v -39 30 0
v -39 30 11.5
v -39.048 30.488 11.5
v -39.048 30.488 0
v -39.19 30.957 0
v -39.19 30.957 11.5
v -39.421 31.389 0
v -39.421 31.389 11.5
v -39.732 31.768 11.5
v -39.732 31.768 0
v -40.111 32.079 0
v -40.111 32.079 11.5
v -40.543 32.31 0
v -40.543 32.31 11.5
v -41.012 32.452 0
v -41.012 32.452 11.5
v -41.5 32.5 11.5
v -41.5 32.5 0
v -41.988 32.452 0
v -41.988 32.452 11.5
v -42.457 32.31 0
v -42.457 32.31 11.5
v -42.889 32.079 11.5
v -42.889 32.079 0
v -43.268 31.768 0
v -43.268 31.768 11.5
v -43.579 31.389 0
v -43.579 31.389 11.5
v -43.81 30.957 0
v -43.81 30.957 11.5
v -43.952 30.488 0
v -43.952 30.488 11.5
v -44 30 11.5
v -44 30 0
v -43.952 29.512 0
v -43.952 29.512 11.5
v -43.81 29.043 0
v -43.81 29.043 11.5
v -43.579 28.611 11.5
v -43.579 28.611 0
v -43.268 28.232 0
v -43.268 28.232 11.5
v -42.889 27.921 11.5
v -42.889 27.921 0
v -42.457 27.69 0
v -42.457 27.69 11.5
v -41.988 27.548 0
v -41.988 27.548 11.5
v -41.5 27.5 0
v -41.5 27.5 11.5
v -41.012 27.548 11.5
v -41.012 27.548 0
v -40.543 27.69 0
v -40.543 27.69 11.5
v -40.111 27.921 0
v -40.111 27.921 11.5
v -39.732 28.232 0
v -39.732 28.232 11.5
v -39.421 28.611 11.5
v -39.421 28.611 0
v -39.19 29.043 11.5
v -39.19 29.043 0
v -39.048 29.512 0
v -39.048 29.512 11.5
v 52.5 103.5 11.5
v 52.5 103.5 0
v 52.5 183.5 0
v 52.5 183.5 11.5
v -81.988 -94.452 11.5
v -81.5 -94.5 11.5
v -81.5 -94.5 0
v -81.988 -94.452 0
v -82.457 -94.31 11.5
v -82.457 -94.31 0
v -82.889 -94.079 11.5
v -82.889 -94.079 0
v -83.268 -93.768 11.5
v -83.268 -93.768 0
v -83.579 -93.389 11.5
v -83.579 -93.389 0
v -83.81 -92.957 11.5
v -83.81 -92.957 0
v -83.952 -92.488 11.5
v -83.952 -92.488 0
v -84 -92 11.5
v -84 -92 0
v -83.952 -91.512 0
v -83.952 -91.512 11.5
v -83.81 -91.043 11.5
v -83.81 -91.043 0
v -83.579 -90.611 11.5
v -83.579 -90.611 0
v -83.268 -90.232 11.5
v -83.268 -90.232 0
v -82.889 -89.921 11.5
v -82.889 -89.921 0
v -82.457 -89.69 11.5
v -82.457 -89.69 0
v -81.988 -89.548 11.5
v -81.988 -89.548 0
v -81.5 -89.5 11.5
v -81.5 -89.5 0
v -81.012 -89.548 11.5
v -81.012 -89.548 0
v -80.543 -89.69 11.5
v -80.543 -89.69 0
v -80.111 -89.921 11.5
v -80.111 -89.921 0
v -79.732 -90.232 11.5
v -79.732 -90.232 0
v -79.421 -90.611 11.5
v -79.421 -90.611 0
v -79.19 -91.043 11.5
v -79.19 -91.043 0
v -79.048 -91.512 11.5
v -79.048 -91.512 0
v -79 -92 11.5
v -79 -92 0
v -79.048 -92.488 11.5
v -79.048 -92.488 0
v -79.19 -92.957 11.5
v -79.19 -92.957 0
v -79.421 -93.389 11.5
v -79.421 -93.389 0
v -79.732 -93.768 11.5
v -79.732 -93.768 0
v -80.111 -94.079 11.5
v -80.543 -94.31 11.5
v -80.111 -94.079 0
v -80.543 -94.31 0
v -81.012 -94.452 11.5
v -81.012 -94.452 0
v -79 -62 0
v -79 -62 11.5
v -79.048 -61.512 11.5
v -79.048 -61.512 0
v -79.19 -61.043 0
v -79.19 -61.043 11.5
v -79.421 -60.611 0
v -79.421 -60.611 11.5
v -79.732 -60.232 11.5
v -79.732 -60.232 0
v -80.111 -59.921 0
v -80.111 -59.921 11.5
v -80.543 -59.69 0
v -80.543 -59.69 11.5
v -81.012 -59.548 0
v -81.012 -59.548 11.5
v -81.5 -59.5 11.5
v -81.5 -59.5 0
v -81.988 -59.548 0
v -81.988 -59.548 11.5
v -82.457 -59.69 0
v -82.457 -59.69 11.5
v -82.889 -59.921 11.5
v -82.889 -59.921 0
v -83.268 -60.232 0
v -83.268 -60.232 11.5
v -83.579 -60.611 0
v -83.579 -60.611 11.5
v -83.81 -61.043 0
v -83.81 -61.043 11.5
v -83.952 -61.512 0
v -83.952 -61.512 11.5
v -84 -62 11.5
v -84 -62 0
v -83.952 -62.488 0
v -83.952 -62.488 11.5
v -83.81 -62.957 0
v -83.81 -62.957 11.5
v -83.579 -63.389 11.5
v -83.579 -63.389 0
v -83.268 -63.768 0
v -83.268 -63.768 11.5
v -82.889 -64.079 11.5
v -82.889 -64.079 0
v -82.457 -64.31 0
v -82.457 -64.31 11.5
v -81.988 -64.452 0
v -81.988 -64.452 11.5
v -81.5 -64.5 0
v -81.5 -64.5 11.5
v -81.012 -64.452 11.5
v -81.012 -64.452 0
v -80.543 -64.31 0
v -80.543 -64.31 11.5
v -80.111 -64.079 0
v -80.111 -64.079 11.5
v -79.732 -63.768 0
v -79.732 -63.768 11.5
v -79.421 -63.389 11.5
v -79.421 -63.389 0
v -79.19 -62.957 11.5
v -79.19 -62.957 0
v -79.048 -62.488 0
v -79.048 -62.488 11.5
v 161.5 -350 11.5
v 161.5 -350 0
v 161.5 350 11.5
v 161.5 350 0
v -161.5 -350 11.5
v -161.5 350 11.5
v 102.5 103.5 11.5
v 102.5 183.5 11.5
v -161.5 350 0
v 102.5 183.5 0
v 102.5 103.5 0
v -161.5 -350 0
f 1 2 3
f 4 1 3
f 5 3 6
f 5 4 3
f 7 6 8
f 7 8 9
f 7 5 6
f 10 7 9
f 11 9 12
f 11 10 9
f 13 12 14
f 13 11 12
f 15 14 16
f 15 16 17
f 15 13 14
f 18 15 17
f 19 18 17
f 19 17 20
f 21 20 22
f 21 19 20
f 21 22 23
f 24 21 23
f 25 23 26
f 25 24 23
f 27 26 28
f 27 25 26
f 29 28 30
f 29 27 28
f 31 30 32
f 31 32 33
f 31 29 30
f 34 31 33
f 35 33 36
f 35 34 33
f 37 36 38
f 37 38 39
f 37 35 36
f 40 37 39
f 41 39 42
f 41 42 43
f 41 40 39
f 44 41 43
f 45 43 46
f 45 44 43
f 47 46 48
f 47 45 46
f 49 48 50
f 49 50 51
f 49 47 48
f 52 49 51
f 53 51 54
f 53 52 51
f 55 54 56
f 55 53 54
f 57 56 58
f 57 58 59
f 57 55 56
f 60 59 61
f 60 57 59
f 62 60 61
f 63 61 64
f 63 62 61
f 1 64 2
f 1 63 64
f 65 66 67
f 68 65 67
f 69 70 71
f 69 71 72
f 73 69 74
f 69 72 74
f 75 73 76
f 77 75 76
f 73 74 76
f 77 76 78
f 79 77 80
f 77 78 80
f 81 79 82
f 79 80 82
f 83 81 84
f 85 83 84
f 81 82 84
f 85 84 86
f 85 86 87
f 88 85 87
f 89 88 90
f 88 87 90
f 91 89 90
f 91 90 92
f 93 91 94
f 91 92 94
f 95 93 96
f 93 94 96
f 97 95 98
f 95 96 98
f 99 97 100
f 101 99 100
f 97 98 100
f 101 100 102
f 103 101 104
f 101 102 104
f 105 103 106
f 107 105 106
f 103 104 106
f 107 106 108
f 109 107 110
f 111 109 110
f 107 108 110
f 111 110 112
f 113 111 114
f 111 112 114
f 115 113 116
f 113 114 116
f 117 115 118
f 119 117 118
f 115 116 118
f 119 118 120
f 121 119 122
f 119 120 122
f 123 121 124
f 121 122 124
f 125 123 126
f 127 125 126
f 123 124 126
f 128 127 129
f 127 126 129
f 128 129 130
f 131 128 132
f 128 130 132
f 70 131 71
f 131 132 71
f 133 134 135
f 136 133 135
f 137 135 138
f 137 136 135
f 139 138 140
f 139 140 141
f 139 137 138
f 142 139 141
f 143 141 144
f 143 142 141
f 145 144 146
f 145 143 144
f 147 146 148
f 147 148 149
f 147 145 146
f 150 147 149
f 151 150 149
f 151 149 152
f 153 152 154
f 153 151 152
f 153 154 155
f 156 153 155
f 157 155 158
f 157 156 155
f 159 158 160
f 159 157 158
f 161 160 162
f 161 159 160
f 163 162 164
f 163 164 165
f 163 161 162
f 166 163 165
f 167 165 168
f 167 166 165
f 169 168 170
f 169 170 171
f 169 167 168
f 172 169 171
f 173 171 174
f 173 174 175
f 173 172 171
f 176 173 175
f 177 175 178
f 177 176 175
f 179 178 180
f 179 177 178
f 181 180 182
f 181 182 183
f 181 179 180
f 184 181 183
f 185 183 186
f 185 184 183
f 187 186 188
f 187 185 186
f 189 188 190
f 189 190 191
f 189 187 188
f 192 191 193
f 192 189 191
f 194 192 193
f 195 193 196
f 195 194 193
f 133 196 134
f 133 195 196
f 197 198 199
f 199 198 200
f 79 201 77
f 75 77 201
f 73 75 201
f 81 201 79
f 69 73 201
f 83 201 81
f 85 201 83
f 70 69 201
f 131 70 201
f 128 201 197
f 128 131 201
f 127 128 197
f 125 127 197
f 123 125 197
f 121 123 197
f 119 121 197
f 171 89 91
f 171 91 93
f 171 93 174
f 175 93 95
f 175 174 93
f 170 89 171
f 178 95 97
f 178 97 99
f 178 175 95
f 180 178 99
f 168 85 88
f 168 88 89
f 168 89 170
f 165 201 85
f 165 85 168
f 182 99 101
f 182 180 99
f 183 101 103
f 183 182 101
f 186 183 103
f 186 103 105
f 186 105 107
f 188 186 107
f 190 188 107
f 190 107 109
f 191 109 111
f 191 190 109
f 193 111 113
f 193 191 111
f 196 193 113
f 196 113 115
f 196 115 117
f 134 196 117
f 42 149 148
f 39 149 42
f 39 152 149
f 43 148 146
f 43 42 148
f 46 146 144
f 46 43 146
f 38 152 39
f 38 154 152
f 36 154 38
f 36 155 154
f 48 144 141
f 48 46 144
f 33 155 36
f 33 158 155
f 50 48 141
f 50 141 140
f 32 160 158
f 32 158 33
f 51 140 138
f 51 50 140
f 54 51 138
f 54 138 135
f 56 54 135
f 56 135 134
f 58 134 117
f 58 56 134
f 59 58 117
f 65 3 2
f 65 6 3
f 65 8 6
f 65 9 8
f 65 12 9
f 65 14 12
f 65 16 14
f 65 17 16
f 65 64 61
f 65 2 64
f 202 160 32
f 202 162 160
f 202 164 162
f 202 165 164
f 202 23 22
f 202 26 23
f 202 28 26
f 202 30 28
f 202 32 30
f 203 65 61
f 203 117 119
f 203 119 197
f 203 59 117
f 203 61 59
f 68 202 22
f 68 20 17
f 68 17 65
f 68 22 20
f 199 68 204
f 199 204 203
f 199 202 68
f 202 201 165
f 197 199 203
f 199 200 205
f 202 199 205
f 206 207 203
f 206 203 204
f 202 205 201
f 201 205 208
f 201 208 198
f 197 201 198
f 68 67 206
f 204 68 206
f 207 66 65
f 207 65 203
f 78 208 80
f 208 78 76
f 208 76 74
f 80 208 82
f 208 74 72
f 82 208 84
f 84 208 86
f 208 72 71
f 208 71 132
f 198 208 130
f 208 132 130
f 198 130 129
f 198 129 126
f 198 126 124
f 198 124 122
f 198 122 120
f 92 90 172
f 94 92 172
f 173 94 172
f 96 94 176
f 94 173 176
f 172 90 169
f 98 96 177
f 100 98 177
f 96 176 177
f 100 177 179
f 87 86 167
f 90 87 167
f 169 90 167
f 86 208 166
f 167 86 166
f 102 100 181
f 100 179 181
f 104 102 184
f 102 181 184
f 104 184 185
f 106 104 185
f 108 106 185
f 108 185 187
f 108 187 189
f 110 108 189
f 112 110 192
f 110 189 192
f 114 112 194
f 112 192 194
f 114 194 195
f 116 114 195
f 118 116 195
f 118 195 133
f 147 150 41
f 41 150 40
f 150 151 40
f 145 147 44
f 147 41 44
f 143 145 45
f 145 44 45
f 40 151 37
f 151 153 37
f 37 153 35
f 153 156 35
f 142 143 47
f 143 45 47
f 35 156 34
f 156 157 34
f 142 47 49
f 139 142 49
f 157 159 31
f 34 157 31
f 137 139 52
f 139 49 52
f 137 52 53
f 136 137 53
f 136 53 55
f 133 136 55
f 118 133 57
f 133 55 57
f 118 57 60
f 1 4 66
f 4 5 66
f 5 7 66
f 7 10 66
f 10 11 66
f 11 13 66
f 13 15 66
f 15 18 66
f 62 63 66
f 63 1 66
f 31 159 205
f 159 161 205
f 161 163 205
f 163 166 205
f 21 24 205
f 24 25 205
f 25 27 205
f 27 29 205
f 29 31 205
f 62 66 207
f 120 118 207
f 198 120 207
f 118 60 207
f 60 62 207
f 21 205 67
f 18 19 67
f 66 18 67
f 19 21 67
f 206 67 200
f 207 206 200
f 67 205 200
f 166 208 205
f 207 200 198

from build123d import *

# Parameters (mm, degrees)
SKETCH1_W           = 50
SKETCH1_H           = 80
SKETCH1_R           = 2.5
BOSS_EXTRUDE1_DEPTH = 11.5


with BuildPart() as part:
    # Sketch1 → Boss-Extrude1 (new body)
    with BuildSketch(Plane.XY):
        Polygon((-161.5, 350), (-161.5, -350), (-81.5, -350), (161.5, -350), (161.5, 350), align=None)
        with Locations((77.5, 143.5)):
            Rectangle(SKETCH1_W, SKETCH1_H, mode=Mode.SUBTRACT)
        with BuildLine():
            ThreePointArc((-81.5, -89.5), (-79, -92), (-81.5, -94.5))
            ThreePointArc((-81.5, -94.5), (-84, -92), (-81.5, -89.5))
        make_face(mode=Mode.SUBTRACT)
        with Locations((-81.5, -62)):
            Circle(SKETCH1_R, mode=Mode.SUBTRACT)
        with Locations((-41.5, 30)):
            Circle(SKETCH1_R, mode=Mode.SUBTRACT)
    extrude(amount=BOSS_EXTRUDE1_DEPTH)


solid = part.part
